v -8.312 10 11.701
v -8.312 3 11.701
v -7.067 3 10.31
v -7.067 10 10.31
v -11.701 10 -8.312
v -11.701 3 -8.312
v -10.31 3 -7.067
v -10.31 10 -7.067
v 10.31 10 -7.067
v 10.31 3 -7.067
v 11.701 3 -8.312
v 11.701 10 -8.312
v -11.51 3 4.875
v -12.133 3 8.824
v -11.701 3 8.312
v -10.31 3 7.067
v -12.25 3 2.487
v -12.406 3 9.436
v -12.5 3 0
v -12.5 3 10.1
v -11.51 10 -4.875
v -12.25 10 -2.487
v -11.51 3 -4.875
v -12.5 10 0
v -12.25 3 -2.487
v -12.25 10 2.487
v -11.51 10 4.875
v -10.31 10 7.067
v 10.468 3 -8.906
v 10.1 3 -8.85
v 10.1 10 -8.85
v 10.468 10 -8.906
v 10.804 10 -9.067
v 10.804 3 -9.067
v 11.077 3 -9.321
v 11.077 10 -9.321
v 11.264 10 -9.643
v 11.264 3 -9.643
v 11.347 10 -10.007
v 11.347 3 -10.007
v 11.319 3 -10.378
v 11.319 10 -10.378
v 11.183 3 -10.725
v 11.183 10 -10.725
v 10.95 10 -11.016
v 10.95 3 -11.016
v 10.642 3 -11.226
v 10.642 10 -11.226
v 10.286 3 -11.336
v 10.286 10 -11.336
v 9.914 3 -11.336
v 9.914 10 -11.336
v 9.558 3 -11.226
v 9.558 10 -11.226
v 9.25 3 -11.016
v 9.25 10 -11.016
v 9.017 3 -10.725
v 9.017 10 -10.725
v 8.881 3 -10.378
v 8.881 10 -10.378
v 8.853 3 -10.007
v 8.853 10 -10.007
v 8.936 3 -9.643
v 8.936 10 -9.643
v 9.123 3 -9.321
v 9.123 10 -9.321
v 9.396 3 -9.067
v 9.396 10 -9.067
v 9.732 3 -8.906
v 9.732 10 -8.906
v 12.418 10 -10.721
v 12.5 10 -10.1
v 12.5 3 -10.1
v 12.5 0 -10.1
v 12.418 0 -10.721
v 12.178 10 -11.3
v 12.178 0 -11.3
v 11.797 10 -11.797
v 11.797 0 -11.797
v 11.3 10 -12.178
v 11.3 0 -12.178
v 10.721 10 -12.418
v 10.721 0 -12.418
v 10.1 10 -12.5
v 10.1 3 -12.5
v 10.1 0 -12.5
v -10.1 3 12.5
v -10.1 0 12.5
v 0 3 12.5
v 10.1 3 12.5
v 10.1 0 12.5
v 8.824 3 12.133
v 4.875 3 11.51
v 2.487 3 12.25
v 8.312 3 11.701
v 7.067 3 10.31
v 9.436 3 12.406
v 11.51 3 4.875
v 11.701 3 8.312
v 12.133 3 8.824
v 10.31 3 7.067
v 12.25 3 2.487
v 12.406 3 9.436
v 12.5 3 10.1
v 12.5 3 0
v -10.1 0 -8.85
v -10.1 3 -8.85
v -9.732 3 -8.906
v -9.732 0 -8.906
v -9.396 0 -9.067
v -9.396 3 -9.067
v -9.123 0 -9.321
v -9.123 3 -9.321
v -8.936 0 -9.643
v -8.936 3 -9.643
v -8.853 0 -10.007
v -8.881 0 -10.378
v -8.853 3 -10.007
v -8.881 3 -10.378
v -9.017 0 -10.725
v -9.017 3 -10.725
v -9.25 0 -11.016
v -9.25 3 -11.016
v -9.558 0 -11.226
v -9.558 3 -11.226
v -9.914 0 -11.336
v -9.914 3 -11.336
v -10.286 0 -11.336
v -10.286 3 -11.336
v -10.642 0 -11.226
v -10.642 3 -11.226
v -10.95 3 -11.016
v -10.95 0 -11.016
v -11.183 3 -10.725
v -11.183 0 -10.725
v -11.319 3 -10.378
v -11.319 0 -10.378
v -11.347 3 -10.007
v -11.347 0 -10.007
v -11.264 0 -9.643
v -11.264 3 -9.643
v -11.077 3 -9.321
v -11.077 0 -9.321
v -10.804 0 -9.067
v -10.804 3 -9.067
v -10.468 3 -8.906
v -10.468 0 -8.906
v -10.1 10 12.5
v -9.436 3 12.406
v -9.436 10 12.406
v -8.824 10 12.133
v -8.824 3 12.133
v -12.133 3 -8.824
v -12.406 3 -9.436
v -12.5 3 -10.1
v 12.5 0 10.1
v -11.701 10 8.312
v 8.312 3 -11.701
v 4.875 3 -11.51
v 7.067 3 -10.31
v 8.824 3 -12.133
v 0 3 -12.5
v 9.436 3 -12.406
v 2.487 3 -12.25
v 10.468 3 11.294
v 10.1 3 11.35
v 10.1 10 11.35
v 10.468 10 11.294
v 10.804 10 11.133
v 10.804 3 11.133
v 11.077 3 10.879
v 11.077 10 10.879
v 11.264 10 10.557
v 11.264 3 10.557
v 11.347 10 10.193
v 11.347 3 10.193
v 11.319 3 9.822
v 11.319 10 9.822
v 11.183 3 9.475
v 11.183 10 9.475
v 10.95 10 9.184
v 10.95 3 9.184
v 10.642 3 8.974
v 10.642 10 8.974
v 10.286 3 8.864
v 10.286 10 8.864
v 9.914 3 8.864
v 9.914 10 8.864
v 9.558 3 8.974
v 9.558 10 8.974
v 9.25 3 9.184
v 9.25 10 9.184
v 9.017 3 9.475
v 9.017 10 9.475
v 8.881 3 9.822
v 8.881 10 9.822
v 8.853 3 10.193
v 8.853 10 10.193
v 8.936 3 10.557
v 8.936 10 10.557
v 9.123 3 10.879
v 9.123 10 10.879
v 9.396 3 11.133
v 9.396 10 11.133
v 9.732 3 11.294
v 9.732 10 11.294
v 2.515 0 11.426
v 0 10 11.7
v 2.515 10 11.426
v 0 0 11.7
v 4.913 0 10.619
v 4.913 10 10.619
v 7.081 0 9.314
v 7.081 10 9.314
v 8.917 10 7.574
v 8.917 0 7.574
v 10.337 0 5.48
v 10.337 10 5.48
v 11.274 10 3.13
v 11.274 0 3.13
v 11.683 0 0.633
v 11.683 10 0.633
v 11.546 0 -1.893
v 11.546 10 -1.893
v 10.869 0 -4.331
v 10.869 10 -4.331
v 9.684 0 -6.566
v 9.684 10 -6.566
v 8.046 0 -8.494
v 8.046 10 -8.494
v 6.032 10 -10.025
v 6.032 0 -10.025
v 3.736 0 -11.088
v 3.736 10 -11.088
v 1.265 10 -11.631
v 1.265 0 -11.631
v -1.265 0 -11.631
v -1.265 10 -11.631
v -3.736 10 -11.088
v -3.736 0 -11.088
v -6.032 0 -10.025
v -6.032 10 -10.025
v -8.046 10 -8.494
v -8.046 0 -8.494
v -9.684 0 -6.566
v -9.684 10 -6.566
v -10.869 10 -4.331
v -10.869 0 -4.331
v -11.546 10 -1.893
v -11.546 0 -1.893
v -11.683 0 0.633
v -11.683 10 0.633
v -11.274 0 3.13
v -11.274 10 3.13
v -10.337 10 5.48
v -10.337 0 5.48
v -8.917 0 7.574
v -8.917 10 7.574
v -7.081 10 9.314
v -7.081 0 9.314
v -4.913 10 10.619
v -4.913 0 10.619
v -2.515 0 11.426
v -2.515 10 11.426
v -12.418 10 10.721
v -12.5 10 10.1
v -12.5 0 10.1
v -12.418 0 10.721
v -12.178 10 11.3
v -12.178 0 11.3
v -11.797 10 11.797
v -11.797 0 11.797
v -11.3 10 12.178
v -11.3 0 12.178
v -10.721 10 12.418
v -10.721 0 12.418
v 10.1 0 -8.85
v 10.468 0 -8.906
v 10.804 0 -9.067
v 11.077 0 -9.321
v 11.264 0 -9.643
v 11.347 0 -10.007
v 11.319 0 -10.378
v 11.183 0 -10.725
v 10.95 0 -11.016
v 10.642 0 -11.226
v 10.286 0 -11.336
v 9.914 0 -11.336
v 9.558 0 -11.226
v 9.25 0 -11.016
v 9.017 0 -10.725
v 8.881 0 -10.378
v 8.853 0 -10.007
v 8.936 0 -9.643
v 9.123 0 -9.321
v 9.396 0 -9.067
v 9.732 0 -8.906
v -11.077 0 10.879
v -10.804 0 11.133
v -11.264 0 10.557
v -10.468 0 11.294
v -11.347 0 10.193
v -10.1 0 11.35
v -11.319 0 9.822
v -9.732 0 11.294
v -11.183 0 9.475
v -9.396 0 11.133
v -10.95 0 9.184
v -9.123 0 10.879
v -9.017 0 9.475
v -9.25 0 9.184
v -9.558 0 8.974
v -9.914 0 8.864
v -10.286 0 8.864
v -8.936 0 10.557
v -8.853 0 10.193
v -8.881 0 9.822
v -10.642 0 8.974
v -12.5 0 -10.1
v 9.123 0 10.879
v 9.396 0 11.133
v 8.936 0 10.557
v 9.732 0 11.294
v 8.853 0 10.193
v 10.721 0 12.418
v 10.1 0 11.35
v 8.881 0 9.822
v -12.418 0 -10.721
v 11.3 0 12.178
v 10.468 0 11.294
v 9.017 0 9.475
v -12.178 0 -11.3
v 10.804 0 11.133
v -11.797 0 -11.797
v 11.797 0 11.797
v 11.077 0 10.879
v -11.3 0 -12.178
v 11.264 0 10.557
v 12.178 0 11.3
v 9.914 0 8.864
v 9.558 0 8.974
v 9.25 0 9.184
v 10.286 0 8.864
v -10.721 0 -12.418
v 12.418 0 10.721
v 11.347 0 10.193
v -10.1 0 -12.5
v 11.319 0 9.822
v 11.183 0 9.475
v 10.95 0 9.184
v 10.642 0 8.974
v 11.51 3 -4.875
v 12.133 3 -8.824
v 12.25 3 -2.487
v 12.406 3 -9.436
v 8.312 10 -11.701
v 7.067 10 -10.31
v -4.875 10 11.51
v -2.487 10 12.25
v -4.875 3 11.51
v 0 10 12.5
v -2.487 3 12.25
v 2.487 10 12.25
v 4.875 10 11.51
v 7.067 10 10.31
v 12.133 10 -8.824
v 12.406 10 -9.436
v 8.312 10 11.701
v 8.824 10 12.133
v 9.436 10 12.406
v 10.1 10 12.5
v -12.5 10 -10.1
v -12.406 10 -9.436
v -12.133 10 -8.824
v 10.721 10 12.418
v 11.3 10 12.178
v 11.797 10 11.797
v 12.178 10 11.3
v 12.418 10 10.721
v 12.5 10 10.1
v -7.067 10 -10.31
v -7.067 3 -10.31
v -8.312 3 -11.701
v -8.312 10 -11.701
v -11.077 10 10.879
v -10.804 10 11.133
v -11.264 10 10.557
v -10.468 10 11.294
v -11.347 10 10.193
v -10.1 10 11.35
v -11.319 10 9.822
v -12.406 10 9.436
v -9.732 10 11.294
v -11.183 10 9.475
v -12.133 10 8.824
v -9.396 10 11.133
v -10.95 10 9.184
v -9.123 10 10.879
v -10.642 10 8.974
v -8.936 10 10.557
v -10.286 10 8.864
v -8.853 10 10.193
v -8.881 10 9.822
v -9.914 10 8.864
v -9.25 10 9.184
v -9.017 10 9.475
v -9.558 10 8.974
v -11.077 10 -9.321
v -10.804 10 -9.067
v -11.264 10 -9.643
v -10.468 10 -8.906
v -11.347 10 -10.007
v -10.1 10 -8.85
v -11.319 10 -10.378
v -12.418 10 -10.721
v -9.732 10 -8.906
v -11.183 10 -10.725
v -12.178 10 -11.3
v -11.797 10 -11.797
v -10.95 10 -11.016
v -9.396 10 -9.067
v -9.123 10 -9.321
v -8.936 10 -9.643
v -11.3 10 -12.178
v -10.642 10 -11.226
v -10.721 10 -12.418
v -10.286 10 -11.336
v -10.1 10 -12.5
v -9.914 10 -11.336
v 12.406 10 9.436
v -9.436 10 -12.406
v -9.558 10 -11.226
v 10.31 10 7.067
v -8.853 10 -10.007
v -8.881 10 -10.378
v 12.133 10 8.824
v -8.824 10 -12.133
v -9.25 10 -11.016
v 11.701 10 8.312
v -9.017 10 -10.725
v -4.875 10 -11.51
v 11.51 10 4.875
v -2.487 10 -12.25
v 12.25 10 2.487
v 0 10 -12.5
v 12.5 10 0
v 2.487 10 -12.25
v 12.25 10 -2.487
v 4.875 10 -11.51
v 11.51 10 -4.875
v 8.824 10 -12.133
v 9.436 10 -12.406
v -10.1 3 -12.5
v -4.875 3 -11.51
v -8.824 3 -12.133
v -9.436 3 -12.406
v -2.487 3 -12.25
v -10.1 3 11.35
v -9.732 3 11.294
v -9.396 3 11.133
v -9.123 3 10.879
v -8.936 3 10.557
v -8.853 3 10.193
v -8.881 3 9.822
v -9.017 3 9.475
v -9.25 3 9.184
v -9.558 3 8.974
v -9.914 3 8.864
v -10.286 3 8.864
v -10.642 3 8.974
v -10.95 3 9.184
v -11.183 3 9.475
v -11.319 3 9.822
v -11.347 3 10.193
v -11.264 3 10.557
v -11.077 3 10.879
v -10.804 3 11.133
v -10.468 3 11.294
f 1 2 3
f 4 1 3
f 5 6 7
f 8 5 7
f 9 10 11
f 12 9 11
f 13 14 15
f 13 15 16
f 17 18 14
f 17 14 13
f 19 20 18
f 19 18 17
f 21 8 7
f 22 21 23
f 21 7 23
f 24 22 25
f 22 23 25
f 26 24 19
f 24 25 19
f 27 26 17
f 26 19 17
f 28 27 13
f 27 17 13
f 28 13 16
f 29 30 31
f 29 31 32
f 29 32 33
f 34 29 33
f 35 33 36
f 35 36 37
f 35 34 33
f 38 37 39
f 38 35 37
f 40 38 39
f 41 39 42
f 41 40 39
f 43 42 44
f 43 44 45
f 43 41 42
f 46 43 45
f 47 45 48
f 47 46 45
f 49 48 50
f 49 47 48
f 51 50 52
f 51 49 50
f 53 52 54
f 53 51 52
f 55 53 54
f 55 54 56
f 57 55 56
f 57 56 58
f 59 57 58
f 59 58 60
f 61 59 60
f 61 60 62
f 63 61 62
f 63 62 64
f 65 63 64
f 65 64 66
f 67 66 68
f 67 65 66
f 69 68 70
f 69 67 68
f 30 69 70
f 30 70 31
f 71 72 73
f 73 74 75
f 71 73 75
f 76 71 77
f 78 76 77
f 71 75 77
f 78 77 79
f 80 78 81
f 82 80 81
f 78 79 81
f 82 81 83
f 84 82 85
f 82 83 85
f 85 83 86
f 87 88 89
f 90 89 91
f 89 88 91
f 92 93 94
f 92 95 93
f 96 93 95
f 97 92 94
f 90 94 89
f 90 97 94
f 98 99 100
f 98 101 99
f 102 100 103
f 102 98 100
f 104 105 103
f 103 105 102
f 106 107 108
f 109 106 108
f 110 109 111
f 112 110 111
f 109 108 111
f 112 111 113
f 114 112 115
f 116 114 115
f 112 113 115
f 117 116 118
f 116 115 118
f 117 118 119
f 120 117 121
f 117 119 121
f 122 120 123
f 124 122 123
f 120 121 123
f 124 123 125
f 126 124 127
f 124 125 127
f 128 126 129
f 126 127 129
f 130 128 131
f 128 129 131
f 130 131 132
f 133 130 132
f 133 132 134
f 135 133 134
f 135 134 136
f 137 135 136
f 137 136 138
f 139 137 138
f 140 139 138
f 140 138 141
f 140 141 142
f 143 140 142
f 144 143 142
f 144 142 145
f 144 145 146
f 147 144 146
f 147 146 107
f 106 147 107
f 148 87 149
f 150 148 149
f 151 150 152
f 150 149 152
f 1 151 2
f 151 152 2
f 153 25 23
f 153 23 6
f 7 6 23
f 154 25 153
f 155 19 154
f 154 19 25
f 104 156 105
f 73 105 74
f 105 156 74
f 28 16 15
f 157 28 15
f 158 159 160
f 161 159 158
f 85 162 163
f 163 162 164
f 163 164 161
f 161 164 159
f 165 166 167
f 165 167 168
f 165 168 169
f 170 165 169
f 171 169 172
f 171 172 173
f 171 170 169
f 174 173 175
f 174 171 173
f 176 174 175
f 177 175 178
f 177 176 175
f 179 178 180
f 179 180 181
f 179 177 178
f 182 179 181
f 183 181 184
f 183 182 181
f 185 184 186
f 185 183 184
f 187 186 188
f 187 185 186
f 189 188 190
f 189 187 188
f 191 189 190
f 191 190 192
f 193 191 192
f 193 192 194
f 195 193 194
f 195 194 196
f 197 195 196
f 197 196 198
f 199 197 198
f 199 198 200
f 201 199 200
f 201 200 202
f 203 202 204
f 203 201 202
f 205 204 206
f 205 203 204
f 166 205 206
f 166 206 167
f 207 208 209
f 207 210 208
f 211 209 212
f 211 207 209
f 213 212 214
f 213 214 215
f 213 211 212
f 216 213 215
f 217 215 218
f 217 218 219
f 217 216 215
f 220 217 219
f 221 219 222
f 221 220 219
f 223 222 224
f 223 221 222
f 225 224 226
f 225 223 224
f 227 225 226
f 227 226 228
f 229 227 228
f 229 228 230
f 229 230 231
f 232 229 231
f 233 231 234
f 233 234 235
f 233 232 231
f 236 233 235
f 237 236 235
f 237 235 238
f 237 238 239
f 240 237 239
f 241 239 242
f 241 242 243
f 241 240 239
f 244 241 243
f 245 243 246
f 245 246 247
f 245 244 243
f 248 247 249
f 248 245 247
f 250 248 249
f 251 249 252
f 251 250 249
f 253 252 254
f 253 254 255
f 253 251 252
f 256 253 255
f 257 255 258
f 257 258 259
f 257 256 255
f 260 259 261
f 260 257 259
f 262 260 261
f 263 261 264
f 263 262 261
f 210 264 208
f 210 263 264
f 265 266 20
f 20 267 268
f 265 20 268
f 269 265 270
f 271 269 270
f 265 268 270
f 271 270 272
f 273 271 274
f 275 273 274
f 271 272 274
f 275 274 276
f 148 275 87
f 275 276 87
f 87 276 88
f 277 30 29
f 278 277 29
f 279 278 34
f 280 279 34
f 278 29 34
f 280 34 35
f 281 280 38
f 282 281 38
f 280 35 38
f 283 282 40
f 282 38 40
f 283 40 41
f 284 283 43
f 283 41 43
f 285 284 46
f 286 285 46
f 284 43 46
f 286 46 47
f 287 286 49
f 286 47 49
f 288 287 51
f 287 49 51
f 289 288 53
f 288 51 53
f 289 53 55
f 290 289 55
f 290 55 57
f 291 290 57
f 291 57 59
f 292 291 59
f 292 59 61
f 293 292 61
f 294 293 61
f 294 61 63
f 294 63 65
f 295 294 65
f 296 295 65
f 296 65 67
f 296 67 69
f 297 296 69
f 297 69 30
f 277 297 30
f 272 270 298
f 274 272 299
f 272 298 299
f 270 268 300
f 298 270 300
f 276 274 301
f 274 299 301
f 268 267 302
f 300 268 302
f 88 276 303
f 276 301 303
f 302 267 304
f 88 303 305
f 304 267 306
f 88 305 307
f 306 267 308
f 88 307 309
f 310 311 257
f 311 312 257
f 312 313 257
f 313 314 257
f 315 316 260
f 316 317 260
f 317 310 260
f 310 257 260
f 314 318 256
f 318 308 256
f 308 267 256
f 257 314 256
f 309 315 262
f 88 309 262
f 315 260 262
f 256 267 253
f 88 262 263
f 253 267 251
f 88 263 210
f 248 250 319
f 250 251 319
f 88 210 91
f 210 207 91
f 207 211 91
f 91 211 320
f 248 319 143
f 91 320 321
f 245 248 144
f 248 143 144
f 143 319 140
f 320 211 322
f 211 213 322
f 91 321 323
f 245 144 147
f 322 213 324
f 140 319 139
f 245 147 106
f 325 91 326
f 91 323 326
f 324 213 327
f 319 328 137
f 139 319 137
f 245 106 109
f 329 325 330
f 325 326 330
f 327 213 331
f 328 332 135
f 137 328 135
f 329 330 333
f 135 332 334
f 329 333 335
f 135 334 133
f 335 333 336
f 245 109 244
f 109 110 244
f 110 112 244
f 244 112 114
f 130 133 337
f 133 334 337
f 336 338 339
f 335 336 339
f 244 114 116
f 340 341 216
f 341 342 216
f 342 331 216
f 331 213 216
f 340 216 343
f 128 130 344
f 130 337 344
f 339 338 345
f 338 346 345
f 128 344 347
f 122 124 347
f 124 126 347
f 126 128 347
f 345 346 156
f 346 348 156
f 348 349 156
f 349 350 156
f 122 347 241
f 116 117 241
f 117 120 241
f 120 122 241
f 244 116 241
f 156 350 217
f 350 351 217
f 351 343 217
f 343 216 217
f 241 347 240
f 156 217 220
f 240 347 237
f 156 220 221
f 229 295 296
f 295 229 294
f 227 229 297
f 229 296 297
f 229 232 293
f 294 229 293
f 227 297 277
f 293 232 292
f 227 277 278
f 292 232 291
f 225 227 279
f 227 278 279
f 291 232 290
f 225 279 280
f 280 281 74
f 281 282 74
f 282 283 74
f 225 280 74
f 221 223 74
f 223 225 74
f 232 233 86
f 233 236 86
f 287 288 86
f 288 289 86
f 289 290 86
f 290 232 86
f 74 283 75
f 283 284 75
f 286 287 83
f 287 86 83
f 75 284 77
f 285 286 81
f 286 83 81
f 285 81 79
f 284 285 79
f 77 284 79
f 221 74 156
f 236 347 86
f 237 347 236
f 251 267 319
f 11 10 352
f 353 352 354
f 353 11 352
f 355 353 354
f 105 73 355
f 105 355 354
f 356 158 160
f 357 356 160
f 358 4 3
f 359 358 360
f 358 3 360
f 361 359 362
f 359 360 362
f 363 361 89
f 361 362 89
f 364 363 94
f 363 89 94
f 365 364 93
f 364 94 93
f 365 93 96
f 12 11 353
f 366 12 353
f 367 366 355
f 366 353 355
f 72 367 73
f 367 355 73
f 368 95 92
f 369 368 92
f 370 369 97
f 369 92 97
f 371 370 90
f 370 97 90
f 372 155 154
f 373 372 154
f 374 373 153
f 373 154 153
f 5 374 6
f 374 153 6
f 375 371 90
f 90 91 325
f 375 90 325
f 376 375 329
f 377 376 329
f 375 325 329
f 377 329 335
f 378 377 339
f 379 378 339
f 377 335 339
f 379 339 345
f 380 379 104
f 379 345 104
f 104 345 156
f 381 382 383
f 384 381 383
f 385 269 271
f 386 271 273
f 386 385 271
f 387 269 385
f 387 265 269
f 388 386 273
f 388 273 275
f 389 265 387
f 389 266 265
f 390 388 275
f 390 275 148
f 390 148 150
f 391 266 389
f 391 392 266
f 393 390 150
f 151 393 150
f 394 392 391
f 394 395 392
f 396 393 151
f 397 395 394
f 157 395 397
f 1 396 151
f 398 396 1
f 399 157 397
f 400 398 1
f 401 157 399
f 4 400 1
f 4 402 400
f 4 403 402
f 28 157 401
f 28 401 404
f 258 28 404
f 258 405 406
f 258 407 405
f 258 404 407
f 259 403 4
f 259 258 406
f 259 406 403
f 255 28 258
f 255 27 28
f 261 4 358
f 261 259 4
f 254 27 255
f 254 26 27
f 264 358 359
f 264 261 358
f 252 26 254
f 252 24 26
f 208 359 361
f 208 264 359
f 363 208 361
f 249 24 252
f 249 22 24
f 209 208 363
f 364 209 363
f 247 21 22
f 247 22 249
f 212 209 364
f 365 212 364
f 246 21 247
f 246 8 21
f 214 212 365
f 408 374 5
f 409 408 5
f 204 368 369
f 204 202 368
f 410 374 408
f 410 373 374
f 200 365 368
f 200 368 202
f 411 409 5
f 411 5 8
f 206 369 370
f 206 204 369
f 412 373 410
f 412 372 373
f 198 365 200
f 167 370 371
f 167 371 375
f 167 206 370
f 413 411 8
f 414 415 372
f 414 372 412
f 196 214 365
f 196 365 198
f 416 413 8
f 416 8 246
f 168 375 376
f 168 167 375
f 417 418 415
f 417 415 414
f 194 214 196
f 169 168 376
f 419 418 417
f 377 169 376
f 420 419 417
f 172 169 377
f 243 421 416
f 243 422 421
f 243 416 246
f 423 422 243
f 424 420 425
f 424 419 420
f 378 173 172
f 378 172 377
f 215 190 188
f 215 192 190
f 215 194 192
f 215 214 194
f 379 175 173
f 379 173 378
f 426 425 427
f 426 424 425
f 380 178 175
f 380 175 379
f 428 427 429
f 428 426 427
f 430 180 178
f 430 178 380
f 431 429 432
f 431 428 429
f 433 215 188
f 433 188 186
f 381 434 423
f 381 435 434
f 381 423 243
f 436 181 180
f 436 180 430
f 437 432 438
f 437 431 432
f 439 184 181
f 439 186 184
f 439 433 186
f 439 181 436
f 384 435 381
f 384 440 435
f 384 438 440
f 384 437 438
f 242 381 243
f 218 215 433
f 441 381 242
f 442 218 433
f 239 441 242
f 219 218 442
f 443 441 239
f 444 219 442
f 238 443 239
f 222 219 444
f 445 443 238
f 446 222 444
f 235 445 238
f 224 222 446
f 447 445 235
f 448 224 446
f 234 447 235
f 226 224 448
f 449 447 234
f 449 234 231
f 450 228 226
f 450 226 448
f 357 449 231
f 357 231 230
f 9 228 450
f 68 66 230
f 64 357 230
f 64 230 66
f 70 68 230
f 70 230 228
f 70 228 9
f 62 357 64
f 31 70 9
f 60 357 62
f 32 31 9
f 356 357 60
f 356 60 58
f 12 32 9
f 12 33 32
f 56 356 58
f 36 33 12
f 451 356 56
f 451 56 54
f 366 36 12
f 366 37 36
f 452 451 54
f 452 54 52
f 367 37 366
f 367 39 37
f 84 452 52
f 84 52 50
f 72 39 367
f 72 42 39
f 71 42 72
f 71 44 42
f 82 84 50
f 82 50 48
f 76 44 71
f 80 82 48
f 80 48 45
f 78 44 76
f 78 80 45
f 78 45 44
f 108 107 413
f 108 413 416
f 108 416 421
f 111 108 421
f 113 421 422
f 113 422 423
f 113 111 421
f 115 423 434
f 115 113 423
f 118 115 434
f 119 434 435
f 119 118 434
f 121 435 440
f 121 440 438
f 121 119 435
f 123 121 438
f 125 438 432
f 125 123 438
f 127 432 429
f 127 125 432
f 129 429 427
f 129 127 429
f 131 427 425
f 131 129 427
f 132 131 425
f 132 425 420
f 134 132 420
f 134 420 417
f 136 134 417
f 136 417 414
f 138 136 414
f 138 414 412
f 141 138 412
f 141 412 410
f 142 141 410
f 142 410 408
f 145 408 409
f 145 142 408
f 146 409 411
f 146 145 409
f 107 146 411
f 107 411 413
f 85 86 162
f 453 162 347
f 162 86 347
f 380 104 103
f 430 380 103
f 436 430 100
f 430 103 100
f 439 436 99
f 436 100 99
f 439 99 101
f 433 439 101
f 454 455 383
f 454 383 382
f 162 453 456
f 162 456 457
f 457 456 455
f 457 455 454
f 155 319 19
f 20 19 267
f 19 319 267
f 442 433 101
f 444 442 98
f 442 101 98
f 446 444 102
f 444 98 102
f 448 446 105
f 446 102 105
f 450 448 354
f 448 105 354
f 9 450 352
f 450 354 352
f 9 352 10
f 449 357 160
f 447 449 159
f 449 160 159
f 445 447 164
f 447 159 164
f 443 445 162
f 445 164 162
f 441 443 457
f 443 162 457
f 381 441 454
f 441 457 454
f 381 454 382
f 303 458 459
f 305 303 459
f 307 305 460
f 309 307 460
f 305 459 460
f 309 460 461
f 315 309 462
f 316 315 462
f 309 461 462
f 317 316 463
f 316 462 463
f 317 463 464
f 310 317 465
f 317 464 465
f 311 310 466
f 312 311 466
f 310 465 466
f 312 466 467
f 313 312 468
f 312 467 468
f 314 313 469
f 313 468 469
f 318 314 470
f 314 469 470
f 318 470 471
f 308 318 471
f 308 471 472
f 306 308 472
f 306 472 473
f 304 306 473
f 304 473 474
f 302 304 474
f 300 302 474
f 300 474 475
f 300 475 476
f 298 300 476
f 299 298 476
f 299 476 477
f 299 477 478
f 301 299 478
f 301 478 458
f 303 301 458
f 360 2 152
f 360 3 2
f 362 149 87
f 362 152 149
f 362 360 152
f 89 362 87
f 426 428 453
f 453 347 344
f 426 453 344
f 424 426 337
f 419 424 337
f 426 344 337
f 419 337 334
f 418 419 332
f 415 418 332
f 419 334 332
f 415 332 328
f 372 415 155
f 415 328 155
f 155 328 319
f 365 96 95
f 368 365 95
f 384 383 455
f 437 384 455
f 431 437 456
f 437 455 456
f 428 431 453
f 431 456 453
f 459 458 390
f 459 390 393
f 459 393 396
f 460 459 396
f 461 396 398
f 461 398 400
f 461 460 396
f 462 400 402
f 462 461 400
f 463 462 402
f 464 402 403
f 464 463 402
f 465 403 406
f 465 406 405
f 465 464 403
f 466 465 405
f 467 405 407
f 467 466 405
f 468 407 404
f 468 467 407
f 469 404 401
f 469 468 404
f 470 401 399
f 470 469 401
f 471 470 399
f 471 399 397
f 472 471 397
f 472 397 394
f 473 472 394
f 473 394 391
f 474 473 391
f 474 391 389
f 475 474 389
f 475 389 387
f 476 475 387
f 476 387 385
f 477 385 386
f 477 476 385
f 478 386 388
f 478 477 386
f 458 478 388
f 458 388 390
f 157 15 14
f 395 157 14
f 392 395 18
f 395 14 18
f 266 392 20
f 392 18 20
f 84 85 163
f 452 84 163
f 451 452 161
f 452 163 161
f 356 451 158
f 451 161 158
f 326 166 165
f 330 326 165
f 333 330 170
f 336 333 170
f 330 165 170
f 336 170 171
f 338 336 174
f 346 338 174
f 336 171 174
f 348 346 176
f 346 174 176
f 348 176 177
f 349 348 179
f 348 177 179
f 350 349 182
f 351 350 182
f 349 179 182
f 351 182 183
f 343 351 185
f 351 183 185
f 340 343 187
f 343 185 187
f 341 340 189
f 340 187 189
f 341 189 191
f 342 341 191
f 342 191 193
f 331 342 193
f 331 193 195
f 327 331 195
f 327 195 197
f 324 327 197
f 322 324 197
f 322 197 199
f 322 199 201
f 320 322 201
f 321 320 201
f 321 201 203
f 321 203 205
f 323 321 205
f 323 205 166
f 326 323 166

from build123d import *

# Parameters (mm, degrees)
SKETCH_1_R          = 11.7
EXTRUDE_1_DEPTH     = 3
SKETCH_2_R          = 1.25
SKETCH_2_R_2        = 11.7
EXTRUDE_2_DEPTH     = 7
SKETCH_2_3_R        = 1.25
CUT_EXTRUDE_1_DEPTH = 20.013153342


with BuildPart() as part:
    # 草图1 → 凸台-拉伸1 (new body)
    with BuildSketch(Plane(origin=(0, 0, 0), x_dir=(1, 0, 0), z_dir=(0, 1, 0))):
        with BuildLine():
            Line((-10.1, -12.5), (10.1, -12.5))
            ThreePointArc((10.1, -12.5), (11.797056275, -11.797056275), (12.5, -10.1))
            Line((12.5, -10.1), (12.5, 10.1))
            ThreePointArc((12.5, 10.1), (11.797056275, 11.797056275), (10.1, 12.5))
            Line((10.1, 12.5), (-10.1, 12.5))
            ThreePointArc((-10.1, 12.5), (-11.797056275, 11.797056275), (-12.5, 10.1))
            Line((-12.5, 10.1), (-12.5, -10.1))
            ThreePointArc((-12.5, -10.1), (-11.797056275, -11.797056275), (-10.1, -12.5))
        make_face()
        Circle(SKETCH_1_R, mode=Mode.SUBTRACT)
    extrude(amount=EXTRUDE_1_DEPTH)

    # 草图2 → 凸台-拉伸2 (add)
    with BuildSketch(Plane(origin=(0, 3, 0), x_dir=(1, 0, 0), z_dir=(0, 1, 0))):
        with BuildLine():
            ThreePointArc((-12.5, -10.1), (-11.797056275, -11.797056275), (-10.1, -12.5))
            ThreePointArc((-10.1, -12.5), (-9.12067077, -12.29109887), (-8.311827358, -11.700761882))
            Line((-8.311827358, -11.700761882), (-7.067198742, -10.310417156))
            ThreePointArc((-7.067198742, -10.310417156), (-3.699309779, -11.940063114), (-1.8e-08, -12.5))
            ThreePointArc((-1.8e-08, -12.5), (3.699309761, -11.940063119), (7.067198742, -10.310417156))
            Line((7.067198742, -10.310417156), (8.311827358, -11.700761882))
            ThreePointArc((8.311827358, -11.700761882), (9.12067077, -12.29109887), (10.1, -12.5))
            ThreePointArc((10.1, -12.5), (11.797056275, -11.797056275), (12.5, -10.1))
            ThreePointArc((12.5, -10.1), (12.29109887, -9.12067077), (11.700761882, -8.311827358))
            Line((11.700761882, -8.311827358), (10.310417156, -7.067198742))
            ThreePointArc((10.310417156, -7.067198742), (11.940063117, -3.69930977), (12.5, 0))
            ThreePointArc((12.5, 0), (11.940063117, 3.69930977), (10.310417156, 7.067198742))
            Line((10.310417156, 7.067198742), (11.700761882, 8.311827358))
            ThreePointArc((11.700761882, 8.311827358), (12.29109887, 9.12067077), (12.5, 10.1))
            ThreePointArc((12.5, 10.1), (11.797056275, 11.797056275), (10.1, 12.5))
            ThreePointArc((10.1, 12.5), (9.12067077, 12.29109887), (8.311827358, 11.700761882))
            Line((8.311827358, 11.700761882), (7.067198742, 10.310417156))
            ThreePointArc((7.067198742, 10.310417156), (3.699309779, 11.940063114), (1.8e-08, 12.5))
            ThreePointArc((1.8e-08, 12.5), (-3.699309761, 11.940063119), (-7.067198742, 10.310417156))
            Line((-7.067198742, 10.310417156), (-8.311827358, 11.700761882))
            ThreePointArc((-8.311827358, 11.700761882), (-9.12067077, 12.29109887), (-10.1, 12.5))
            ThreePointArc((-10.1, 12.5), (-11.797056275, 11.797056275), (-12.5, 10.1))
            ThreePointArc((-12.5, 10.1), (-12.29109887, 9.12067077), (-11.700761882, 8.311827358))
            Line((-11.700761882, 8.311827358), (-10.310417156, 7.067198742))
            ThreePointArc((-10.310417156, 7.067198742), (-11.940063111, 3.699309787), (-12.5, 3.7e-08))
            ThreePointArc((-12.5, 3.7e-08), (-11.940063122, -3.699309752), (-10.310417156, -7.067198742))
            Line((-10.310417156, -7.067198742), (-11.700761882, -8.311827358))
            ThreePointArc((-11.700761882, -8.311827358), (-12.29109887, -9.12067077), (-12.5, -10.1))
        make_face()
        with Locations((-10.1, -10.1)):
            Circle(SKETCH_2_R, mode=Mode.SUBTRACT)
        with Locations((10.1, -10.1)):
            Circle(SKETCH_2_R, mode=Mode.SUBTRACT)
        Circle(SKETCH_2_R_2, mode=Mode.SUBTRACT)
        with Locations((-10.1, 10.1)):
            Circle(SKETCH_2_R, mode=Mode.SUBTRACT)
        with Locations((10.1, 10.1)):
            Circle(SKETCH_2_R, mode=Mode.SUBTRACT)
    extrude(amount=EXTRUDE_2_DEPTH)

    # 草图2<3> → 切除-拉伸1 (cut, through all)
    with BuildSketch(Plane(origin=(0, 3, 0), x_dir=(1, 0, 0), z_dir=(0, 1, 0))):
        with Locations((-10.1, 10.1)):
            Circle(SKETCH_2_3_R)
        with Locations((10.1, 10.1)):
            Circle(SKETCH_2_3_R)
        with Locations((10.1, -10.1)):
            Circle(SKETCH_2_3_R)
        with Locations((-10.1, -10.1)):
            Circle(SKETCH_2_3_R)
    extrude(amount=-CUT_EXTRUDE_1_DEPTH, mode=Mode.SUBTRACT)


solid = part.part
